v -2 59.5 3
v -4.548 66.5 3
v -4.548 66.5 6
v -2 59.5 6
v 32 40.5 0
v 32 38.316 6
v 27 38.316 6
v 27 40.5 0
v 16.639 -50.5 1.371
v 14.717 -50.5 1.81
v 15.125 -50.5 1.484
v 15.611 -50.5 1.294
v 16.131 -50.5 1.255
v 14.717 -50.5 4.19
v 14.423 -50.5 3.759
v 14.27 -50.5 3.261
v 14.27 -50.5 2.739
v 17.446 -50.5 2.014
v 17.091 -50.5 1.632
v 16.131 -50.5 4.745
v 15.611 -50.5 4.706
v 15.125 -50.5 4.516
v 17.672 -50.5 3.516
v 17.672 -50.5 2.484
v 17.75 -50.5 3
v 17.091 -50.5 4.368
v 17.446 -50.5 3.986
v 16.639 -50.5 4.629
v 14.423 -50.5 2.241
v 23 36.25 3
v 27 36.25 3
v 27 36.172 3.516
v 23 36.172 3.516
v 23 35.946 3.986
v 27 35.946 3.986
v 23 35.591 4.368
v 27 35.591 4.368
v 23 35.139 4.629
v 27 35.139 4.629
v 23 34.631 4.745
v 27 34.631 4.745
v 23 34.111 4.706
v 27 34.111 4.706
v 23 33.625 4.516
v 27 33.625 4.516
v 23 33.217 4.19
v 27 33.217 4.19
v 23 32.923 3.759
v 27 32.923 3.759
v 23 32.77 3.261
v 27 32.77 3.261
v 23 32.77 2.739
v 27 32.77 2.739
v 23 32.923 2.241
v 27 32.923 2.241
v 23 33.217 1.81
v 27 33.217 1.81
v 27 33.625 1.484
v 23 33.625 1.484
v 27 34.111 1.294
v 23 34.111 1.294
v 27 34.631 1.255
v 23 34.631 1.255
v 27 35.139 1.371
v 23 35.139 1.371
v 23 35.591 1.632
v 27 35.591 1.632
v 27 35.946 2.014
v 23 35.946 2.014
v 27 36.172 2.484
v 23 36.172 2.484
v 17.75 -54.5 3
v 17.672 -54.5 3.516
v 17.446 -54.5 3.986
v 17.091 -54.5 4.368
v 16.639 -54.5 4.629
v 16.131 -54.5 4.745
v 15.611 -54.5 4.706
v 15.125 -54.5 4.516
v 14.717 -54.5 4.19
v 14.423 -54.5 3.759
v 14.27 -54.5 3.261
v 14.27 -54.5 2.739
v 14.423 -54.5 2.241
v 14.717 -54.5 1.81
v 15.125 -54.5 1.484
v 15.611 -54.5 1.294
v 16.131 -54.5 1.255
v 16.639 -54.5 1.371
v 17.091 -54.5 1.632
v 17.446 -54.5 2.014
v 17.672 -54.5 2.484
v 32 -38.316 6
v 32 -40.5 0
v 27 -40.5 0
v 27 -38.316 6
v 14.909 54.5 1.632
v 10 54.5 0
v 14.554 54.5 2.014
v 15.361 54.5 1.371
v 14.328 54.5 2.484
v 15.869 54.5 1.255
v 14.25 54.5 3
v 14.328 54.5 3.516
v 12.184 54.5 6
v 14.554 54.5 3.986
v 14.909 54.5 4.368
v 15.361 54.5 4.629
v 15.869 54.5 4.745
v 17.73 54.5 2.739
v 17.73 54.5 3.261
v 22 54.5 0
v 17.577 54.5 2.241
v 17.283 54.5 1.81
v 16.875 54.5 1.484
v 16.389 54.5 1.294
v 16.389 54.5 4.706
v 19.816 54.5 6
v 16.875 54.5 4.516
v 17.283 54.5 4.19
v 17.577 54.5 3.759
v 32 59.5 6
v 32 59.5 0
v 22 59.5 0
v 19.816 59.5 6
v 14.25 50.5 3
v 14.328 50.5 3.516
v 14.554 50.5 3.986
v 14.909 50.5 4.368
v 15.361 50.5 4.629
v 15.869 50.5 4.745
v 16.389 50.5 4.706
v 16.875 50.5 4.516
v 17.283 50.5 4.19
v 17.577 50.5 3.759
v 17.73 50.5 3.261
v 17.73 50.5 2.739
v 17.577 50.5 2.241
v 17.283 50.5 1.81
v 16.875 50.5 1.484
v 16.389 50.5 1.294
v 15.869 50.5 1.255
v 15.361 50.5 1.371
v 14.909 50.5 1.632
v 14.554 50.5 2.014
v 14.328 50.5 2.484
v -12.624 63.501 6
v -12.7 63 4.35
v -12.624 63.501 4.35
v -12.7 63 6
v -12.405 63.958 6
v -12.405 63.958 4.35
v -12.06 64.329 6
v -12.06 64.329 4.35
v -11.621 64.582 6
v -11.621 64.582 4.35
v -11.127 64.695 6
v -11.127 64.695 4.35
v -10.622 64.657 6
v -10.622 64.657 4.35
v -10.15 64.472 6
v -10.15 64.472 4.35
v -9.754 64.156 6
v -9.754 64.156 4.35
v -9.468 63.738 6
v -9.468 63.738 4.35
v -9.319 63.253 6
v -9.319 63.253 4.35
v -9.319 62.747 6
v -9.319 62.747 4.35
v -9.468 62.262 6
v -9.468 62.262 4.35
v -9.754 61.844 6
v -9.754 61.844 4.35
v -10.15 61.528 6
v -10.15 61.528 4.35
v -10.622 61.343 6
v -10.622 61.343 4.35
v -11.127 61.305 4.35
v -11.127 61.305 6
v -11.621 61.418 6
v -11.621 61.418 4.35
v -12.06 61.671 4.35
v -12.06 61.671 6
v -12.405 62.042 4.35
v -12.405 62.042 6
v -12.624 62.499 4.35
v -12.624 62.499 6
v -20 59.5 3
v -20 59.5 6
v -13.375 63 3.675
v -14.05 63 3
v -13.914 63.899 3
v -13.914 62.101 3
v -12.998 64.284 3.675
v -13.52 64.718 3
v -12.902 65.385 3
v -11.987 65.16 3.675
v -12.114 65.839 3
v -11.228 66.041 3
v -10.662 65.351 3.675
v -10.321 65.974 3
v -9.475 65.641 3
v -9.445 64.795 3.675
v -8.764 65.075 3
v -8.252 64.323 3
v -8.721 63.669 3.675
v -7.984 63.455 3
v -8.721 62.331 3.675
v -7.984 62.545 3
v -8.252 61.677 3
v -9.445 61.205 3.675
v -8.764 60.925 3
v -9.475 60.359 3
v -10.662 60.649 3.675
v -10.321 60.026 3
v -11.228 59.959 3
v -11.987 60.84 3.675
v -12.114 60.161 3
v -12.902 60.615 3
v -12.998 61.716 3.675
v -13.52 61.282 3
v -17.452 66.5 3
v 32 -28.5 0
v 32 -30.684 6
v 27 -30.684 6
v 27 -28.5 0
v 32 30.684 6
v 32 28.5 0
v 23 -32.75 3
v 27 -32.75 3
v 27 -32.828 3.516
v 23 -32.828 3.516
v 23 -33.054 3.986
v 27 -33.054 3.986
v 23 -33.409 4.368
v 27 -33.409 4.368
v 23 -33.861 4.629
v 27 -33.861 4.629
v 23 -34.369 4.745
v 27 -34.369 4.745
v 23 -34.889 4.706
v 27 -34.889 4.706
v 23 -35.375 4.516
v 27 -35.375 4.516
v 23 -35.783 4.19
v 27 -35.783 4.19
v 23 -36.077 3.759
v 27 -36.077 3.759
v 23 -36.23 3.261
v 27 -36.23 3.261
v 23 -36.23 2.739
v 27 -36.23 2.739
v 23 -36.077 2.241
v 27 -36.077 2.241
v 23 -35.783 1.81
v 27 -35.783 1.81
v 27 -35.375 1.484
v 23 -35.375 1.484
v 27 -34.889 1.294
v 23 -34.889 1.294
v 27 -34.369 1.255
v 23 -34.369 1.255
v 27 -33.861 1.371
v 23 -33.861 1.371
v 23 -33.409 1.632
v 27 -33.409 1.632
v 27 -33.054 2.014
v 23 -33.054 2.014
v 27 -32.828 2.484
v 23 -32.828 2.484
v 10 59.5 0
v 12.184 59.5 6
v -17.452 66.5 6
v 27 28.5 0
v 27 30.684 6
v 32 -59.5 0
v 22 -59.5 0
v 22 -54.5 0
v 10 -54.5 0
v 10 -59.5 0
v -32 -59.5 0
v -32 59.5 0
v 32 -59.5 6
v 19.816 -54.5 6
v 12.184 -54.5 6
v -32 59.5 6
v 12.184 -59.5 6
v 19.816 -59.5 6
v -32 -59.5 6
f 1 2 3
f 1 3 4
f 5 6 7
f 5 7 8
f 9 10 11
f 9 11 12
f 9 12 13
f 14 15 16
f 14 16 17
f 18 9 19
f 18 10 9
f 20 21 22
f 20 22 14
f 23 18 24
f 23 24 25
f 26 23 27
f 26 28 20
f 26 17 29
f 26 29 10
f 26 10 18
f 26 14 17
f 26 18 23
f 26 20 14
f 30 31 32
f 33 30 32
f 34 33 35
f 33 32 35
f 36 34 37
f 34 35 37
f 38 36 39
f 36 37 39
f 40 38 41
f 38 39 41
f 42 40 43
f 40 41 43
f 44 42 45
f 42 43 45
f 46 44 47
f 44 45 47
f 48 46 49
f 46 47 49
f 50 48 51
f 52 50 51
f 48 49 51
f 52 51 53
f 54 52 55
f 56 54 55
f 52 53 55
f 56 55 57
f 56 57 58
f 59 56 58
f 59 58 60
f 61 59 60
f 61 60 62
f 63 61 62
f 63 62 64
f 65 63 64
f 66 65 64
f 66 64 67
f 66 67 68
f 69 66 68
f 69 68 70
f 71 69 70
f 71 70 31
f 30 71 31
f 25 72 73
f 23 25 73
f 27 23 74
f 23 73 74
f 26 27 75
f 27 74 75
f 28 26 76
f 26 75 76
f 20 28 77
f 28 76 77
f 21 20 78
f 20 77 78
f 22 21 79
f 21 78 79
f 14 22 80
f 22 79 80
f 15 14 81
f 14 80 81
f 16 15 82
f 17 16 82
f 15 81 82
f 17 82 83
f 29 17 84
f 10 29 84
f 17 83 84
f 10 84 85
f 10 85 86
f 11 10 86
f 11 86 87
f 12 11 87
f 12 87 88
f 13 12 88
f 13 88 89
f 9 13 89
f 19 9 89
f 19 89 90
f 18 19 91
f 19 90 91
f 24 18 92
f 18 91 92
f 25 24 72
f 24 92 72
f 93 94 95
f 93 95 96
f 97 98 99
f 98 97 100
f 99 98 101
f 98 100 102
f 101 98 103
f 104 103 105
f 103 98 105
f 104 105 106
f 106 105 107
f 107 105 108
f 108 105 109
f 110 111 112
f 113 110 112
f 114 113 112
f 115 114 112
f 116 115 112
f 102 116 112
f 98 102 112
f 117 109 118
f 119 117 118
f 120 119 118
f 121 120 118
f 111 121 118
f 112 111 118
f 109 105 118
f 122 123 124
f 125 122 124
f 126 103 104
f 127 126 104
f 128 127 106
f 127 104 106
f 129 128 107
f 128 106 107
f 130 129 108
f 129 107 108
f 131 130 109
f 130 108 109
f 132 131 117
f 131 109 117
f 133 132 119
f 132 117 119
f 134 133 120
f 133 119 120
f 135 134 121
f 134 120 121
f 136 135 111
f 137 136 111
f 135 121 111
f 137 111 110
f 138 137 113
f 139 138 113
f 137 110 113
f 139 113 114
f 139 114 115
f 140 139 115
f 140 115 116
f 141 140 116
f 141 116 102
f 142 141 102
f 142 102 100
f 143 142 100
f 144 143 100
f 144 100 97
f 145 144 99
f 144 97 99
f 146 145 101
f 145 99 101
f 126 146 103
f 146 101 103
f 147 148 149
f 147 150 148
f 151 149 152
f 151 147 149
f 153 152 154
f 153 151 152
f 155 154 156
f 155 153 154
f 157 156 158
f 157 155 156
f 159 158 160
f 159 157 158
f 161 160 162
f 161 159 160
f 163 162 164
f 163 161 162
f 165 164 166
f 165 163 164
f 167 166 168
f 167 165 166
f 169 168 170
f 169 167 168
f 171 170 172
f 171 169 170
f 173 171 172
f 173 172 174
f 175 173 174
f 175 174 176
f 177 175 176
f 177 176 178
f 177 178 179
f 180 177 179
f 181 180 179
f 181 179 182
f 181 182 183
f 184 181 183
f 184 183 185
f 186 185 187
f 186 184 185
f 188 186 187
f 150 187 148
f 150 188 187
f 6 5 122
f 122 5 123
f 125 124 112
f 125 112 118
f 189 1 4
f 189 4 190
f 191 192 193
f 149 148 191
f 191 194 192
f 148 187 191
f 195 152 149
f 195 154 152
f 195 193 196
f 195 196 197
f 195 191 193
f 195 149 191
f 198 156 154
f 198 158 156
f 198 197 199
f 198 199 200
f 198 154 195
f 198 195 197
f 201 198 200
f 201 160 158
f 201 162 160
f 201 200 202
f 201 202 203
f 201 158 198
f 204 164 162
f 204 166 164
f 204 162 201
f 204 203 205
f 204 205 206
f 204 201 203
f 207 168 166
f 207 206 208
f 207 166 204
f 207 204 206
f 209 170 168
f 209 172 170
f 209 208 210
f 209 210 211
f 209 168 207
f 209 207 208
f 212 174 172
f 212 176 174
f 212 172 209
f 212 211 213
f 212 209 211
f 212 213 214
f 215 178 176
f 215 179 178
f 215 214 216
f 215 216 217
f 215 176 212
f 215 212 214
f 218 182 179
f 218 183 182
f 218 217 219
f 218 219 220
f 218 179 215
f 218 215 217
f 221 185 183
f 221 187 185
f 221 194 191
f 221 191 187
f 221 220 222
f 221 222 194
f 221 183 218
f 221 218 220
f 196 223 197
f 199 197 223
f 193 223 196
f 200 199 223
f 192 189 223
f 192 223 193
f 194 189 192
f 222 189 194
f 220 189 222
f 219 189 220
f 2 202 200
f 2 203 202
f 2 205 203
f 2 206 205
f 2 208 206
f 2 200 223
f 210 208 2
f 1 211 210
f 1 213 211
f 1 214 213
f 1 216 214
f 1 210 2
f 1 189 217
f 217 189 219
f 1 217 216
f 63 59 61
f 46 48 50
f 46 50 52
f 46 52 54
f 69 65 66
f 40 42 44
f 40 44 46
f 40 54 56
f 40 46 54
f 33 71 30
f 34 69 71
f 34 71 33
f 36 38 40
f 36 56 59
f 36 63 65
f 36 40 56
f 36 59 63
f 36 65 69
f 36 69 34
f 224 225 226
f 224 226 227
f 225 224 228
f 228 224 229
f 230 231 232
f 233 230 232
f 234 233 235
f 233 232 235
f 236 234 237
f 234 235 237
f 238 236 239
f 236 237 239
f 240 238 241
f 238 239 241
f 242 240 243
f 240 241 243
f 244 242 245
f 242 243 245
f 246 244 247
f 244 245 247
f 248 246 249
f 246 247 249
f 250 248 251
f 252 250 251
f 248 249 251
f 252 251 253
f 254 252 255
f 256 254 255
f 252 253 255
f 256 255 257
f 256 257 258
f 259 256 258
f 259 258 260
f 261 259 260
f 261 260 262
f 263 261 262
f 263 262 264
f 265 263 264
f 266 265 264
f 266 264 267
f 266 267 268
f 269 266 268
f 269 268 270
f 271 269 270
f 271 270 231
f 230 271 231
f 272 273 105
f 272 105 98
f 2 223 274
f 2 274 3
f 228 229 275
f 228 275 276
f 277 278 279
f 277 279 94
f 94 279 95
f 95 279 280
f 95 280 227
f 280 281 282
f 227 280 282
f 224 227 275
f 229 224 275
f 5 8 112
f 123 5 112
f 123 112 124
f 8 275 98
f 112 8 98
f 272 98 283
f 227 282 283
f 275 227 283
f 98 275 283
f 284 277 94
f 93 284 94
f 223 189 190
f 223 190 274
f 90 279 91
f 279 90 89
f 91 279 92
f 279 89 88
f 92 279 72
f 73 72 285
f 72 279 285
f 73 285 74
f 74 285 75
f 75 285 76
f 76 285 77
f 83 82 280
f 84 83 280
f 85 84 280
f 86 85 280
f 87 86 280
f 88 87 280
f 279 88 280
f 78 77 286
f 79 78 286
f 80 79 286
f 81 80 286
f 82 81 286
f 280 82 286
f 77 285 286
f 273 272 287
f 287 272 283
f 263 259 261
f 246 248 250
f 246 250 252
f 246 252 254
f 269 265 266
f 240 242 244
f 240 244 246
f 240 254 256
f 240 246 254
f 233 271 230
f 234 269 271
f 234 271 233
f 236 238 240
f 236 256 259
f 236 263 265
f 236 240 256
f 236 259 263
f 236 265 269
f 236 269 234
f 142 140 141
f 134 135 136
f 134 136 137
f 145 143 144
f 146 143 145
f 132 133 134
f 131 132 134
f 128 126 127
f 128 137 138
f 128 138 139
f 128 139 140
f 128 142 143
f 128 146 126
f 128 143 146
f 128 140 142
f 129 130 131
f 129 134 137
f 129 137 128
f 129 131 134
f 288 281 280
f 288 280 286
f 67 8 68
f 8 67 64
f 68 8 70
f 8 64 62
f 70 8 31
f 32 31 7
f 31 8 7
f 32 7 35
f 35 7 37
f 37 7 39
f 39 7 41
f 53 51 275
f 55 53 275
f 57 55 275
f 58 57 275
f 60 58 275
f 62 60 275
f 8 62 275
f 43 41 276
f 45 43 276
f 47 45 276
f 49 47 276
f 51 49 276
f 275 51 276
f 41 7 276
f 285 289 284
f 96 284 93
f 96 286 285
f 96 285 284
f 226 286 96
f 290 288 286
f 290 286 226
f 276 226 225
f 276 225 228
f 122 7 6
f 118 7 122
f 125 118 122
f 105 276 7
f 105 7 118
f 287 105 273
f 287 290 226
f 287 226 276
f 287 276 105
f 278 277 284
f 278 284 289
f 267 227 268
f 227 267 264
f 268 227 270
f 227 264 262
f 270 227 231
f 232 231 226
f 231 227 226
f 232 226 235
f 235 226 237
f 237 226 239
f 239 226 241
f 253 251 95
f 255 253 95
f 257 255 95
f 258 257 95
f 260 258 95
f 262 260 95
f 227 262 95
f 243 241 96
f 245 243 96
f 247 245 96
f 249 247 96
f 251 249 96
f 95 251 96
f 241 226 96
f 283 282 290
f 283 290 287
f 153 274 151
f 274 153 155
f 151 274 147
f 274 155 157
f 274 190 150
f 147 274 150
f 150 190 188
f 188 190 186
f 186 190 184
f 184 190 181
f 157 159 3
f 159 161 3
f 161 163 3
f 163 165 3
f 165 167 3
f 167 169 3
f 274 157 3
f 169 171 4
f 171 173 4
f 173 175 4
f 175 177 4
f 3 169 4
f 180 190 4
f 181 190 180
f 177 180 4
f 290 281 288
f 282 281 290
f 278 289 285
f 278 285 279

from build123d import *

# Parameters (mm, degrees)
BINDER020_W         = 119
BINDER020_H         = 64
PAD012_DEPTH        = 6
SKETCH_R            = 1.75
POCKET_DEPTH        = 9
POCKET001_DEPTH     = 5
POCKET002_DEPTH     = 5
SKETCH046_R         = 1.75
POCKET003_DEPTH     = 4
POCKET004_DEPTH     = 5
SKETCH048_R         = 1.75
POCKET005_DEPTH     = 4
PAD013_DEPTH        = 3
HOLE012_D           = 3.4
HOLE012_DEPTH       = 25
HOLE012_CSINK_D     = 6.1
HOLE012_CSINK_ANGLE = 90


with BuildPart() as ch001:
    # Binder020 → Pad012 (new body)
    with BuildSketch(Plane(origin=(0, 0, 0), x_dir=(0, 1, 0), z_dir=(0, 0, 1))):
        Rectangle(BINDER020_W, BINDER020_H)
    extrude(amount=PAD012_DEPTH)

    # Sketch (on Face2 of Pad012) → Pocket (cut)
    with BuildSketch(Plane.YZ.offset(32)):
        with Locations((-34.5, 3)):
            Circle(SKETCH_R)
        with Locations((34.5, 3)):
            Circle(SKETCH_R)
    extrude(amount=-POCKET_DEPTH, mode=Mode.SUBTRACT)

    # Sketch044 (on Face3 of Pocket) → Pocket001 (cut)
    with BuildSketch(Plane.YZ.offset(32)):
        Polygon((-40.5, 0), (-38.316179, 6), (-30.683821, 6), (-28.5, 0), align=None)
        Polygon((30.683821, 6), (38.316179, 6), (40.5, 0), (28.5, 0), align=None)
    extrude(amount=-POCKET001_DEPTH, mode=Mode.SUBTRACT)

    # Sketch045 (on Face1 of Pocket001) → Pocket002 (cut)
    with BuildSketch(Plane.XZ.offset(59.5)):
        Polygon((10, 0), (12.183821, 6), (19.816179, 6), (22, 0), align=None)
    extrude(amount=-POCKET002_DEPTH, mode=Mode.SUBTRACT)

    # Sketch046 (on Face18 of Pocket002) → Pocket003 (cut)
    with BuildSketch(Plane.XZ.offset(54.5)):
        with Locations((16, 3)):
            Circle(SKETCH046_R)
    extrude(amount=-POCKET003_DEPTH, mode=Mode.SUBTRACT)

    # Sketch047 (on Face6 of Pocket003) → Pocket004 (cut)
    with BuildSketch(Plane(origin=(0, 59.5, 0), x_dir=(-1, 0, 0), z_dir=(0, 1, 0))):
        Polygon((-22, 0), (-19.816179, 6), (-12.183821, 6), (-10, 0), align=None)
    extrude(amount=-POCKET004_DEPTH, mode=Mode.SUBTRACT)

    # Sketch048 (on Face20 of Pocket004) → Pocket005 (cut)
    with BuildSketch(Plane(origin=(0, 54.5, 0), x_dir=(-1, 0, 0), z_dir=(0, 1, 0))):
        with Locations((-16, 3)):
            Circle(SKETCH048_R)
    extrude(amount=-POCKET005_DEPTH, mode=Mode.SUBTRACT)


with BuildPart() as body020:
    # Sketch042 (on Face1 of Binder029) → Pad013 (new body)
    with BuildSketch(Plane.XY.offset(3)):
        Polygon((-20, -59.5), (-17.452208, -66.5), (-4.547792, -66.5), (-2, -59.5), align=None)
    extrude(amount=PAD013_DEPTH)

    # Hole012
    with Locations(Plane(origin=(0, 0, 3), x_dir=(1, 0, 0), z_dir=(0, 0, -1))):
        with Locations((-11, 63)):
            CounterSinkHole(HOLE012_D / 2, HOLE012_CSINK_D / 2, depth=HOLE012_DEPTH, counter_sink_angle=HOLE012_CSINK_ANGLE)


with BuildPart() as part_mirroring:
    # Part__Mirroring: instance of Body020
    add(body020.part.mirror(Plane(origin=(0, 0, 0), x_dir=(1, 0, 0), z_dir=(0, 1, 0))))


solid = Compound([ch001.part, part_mirroring.part])
